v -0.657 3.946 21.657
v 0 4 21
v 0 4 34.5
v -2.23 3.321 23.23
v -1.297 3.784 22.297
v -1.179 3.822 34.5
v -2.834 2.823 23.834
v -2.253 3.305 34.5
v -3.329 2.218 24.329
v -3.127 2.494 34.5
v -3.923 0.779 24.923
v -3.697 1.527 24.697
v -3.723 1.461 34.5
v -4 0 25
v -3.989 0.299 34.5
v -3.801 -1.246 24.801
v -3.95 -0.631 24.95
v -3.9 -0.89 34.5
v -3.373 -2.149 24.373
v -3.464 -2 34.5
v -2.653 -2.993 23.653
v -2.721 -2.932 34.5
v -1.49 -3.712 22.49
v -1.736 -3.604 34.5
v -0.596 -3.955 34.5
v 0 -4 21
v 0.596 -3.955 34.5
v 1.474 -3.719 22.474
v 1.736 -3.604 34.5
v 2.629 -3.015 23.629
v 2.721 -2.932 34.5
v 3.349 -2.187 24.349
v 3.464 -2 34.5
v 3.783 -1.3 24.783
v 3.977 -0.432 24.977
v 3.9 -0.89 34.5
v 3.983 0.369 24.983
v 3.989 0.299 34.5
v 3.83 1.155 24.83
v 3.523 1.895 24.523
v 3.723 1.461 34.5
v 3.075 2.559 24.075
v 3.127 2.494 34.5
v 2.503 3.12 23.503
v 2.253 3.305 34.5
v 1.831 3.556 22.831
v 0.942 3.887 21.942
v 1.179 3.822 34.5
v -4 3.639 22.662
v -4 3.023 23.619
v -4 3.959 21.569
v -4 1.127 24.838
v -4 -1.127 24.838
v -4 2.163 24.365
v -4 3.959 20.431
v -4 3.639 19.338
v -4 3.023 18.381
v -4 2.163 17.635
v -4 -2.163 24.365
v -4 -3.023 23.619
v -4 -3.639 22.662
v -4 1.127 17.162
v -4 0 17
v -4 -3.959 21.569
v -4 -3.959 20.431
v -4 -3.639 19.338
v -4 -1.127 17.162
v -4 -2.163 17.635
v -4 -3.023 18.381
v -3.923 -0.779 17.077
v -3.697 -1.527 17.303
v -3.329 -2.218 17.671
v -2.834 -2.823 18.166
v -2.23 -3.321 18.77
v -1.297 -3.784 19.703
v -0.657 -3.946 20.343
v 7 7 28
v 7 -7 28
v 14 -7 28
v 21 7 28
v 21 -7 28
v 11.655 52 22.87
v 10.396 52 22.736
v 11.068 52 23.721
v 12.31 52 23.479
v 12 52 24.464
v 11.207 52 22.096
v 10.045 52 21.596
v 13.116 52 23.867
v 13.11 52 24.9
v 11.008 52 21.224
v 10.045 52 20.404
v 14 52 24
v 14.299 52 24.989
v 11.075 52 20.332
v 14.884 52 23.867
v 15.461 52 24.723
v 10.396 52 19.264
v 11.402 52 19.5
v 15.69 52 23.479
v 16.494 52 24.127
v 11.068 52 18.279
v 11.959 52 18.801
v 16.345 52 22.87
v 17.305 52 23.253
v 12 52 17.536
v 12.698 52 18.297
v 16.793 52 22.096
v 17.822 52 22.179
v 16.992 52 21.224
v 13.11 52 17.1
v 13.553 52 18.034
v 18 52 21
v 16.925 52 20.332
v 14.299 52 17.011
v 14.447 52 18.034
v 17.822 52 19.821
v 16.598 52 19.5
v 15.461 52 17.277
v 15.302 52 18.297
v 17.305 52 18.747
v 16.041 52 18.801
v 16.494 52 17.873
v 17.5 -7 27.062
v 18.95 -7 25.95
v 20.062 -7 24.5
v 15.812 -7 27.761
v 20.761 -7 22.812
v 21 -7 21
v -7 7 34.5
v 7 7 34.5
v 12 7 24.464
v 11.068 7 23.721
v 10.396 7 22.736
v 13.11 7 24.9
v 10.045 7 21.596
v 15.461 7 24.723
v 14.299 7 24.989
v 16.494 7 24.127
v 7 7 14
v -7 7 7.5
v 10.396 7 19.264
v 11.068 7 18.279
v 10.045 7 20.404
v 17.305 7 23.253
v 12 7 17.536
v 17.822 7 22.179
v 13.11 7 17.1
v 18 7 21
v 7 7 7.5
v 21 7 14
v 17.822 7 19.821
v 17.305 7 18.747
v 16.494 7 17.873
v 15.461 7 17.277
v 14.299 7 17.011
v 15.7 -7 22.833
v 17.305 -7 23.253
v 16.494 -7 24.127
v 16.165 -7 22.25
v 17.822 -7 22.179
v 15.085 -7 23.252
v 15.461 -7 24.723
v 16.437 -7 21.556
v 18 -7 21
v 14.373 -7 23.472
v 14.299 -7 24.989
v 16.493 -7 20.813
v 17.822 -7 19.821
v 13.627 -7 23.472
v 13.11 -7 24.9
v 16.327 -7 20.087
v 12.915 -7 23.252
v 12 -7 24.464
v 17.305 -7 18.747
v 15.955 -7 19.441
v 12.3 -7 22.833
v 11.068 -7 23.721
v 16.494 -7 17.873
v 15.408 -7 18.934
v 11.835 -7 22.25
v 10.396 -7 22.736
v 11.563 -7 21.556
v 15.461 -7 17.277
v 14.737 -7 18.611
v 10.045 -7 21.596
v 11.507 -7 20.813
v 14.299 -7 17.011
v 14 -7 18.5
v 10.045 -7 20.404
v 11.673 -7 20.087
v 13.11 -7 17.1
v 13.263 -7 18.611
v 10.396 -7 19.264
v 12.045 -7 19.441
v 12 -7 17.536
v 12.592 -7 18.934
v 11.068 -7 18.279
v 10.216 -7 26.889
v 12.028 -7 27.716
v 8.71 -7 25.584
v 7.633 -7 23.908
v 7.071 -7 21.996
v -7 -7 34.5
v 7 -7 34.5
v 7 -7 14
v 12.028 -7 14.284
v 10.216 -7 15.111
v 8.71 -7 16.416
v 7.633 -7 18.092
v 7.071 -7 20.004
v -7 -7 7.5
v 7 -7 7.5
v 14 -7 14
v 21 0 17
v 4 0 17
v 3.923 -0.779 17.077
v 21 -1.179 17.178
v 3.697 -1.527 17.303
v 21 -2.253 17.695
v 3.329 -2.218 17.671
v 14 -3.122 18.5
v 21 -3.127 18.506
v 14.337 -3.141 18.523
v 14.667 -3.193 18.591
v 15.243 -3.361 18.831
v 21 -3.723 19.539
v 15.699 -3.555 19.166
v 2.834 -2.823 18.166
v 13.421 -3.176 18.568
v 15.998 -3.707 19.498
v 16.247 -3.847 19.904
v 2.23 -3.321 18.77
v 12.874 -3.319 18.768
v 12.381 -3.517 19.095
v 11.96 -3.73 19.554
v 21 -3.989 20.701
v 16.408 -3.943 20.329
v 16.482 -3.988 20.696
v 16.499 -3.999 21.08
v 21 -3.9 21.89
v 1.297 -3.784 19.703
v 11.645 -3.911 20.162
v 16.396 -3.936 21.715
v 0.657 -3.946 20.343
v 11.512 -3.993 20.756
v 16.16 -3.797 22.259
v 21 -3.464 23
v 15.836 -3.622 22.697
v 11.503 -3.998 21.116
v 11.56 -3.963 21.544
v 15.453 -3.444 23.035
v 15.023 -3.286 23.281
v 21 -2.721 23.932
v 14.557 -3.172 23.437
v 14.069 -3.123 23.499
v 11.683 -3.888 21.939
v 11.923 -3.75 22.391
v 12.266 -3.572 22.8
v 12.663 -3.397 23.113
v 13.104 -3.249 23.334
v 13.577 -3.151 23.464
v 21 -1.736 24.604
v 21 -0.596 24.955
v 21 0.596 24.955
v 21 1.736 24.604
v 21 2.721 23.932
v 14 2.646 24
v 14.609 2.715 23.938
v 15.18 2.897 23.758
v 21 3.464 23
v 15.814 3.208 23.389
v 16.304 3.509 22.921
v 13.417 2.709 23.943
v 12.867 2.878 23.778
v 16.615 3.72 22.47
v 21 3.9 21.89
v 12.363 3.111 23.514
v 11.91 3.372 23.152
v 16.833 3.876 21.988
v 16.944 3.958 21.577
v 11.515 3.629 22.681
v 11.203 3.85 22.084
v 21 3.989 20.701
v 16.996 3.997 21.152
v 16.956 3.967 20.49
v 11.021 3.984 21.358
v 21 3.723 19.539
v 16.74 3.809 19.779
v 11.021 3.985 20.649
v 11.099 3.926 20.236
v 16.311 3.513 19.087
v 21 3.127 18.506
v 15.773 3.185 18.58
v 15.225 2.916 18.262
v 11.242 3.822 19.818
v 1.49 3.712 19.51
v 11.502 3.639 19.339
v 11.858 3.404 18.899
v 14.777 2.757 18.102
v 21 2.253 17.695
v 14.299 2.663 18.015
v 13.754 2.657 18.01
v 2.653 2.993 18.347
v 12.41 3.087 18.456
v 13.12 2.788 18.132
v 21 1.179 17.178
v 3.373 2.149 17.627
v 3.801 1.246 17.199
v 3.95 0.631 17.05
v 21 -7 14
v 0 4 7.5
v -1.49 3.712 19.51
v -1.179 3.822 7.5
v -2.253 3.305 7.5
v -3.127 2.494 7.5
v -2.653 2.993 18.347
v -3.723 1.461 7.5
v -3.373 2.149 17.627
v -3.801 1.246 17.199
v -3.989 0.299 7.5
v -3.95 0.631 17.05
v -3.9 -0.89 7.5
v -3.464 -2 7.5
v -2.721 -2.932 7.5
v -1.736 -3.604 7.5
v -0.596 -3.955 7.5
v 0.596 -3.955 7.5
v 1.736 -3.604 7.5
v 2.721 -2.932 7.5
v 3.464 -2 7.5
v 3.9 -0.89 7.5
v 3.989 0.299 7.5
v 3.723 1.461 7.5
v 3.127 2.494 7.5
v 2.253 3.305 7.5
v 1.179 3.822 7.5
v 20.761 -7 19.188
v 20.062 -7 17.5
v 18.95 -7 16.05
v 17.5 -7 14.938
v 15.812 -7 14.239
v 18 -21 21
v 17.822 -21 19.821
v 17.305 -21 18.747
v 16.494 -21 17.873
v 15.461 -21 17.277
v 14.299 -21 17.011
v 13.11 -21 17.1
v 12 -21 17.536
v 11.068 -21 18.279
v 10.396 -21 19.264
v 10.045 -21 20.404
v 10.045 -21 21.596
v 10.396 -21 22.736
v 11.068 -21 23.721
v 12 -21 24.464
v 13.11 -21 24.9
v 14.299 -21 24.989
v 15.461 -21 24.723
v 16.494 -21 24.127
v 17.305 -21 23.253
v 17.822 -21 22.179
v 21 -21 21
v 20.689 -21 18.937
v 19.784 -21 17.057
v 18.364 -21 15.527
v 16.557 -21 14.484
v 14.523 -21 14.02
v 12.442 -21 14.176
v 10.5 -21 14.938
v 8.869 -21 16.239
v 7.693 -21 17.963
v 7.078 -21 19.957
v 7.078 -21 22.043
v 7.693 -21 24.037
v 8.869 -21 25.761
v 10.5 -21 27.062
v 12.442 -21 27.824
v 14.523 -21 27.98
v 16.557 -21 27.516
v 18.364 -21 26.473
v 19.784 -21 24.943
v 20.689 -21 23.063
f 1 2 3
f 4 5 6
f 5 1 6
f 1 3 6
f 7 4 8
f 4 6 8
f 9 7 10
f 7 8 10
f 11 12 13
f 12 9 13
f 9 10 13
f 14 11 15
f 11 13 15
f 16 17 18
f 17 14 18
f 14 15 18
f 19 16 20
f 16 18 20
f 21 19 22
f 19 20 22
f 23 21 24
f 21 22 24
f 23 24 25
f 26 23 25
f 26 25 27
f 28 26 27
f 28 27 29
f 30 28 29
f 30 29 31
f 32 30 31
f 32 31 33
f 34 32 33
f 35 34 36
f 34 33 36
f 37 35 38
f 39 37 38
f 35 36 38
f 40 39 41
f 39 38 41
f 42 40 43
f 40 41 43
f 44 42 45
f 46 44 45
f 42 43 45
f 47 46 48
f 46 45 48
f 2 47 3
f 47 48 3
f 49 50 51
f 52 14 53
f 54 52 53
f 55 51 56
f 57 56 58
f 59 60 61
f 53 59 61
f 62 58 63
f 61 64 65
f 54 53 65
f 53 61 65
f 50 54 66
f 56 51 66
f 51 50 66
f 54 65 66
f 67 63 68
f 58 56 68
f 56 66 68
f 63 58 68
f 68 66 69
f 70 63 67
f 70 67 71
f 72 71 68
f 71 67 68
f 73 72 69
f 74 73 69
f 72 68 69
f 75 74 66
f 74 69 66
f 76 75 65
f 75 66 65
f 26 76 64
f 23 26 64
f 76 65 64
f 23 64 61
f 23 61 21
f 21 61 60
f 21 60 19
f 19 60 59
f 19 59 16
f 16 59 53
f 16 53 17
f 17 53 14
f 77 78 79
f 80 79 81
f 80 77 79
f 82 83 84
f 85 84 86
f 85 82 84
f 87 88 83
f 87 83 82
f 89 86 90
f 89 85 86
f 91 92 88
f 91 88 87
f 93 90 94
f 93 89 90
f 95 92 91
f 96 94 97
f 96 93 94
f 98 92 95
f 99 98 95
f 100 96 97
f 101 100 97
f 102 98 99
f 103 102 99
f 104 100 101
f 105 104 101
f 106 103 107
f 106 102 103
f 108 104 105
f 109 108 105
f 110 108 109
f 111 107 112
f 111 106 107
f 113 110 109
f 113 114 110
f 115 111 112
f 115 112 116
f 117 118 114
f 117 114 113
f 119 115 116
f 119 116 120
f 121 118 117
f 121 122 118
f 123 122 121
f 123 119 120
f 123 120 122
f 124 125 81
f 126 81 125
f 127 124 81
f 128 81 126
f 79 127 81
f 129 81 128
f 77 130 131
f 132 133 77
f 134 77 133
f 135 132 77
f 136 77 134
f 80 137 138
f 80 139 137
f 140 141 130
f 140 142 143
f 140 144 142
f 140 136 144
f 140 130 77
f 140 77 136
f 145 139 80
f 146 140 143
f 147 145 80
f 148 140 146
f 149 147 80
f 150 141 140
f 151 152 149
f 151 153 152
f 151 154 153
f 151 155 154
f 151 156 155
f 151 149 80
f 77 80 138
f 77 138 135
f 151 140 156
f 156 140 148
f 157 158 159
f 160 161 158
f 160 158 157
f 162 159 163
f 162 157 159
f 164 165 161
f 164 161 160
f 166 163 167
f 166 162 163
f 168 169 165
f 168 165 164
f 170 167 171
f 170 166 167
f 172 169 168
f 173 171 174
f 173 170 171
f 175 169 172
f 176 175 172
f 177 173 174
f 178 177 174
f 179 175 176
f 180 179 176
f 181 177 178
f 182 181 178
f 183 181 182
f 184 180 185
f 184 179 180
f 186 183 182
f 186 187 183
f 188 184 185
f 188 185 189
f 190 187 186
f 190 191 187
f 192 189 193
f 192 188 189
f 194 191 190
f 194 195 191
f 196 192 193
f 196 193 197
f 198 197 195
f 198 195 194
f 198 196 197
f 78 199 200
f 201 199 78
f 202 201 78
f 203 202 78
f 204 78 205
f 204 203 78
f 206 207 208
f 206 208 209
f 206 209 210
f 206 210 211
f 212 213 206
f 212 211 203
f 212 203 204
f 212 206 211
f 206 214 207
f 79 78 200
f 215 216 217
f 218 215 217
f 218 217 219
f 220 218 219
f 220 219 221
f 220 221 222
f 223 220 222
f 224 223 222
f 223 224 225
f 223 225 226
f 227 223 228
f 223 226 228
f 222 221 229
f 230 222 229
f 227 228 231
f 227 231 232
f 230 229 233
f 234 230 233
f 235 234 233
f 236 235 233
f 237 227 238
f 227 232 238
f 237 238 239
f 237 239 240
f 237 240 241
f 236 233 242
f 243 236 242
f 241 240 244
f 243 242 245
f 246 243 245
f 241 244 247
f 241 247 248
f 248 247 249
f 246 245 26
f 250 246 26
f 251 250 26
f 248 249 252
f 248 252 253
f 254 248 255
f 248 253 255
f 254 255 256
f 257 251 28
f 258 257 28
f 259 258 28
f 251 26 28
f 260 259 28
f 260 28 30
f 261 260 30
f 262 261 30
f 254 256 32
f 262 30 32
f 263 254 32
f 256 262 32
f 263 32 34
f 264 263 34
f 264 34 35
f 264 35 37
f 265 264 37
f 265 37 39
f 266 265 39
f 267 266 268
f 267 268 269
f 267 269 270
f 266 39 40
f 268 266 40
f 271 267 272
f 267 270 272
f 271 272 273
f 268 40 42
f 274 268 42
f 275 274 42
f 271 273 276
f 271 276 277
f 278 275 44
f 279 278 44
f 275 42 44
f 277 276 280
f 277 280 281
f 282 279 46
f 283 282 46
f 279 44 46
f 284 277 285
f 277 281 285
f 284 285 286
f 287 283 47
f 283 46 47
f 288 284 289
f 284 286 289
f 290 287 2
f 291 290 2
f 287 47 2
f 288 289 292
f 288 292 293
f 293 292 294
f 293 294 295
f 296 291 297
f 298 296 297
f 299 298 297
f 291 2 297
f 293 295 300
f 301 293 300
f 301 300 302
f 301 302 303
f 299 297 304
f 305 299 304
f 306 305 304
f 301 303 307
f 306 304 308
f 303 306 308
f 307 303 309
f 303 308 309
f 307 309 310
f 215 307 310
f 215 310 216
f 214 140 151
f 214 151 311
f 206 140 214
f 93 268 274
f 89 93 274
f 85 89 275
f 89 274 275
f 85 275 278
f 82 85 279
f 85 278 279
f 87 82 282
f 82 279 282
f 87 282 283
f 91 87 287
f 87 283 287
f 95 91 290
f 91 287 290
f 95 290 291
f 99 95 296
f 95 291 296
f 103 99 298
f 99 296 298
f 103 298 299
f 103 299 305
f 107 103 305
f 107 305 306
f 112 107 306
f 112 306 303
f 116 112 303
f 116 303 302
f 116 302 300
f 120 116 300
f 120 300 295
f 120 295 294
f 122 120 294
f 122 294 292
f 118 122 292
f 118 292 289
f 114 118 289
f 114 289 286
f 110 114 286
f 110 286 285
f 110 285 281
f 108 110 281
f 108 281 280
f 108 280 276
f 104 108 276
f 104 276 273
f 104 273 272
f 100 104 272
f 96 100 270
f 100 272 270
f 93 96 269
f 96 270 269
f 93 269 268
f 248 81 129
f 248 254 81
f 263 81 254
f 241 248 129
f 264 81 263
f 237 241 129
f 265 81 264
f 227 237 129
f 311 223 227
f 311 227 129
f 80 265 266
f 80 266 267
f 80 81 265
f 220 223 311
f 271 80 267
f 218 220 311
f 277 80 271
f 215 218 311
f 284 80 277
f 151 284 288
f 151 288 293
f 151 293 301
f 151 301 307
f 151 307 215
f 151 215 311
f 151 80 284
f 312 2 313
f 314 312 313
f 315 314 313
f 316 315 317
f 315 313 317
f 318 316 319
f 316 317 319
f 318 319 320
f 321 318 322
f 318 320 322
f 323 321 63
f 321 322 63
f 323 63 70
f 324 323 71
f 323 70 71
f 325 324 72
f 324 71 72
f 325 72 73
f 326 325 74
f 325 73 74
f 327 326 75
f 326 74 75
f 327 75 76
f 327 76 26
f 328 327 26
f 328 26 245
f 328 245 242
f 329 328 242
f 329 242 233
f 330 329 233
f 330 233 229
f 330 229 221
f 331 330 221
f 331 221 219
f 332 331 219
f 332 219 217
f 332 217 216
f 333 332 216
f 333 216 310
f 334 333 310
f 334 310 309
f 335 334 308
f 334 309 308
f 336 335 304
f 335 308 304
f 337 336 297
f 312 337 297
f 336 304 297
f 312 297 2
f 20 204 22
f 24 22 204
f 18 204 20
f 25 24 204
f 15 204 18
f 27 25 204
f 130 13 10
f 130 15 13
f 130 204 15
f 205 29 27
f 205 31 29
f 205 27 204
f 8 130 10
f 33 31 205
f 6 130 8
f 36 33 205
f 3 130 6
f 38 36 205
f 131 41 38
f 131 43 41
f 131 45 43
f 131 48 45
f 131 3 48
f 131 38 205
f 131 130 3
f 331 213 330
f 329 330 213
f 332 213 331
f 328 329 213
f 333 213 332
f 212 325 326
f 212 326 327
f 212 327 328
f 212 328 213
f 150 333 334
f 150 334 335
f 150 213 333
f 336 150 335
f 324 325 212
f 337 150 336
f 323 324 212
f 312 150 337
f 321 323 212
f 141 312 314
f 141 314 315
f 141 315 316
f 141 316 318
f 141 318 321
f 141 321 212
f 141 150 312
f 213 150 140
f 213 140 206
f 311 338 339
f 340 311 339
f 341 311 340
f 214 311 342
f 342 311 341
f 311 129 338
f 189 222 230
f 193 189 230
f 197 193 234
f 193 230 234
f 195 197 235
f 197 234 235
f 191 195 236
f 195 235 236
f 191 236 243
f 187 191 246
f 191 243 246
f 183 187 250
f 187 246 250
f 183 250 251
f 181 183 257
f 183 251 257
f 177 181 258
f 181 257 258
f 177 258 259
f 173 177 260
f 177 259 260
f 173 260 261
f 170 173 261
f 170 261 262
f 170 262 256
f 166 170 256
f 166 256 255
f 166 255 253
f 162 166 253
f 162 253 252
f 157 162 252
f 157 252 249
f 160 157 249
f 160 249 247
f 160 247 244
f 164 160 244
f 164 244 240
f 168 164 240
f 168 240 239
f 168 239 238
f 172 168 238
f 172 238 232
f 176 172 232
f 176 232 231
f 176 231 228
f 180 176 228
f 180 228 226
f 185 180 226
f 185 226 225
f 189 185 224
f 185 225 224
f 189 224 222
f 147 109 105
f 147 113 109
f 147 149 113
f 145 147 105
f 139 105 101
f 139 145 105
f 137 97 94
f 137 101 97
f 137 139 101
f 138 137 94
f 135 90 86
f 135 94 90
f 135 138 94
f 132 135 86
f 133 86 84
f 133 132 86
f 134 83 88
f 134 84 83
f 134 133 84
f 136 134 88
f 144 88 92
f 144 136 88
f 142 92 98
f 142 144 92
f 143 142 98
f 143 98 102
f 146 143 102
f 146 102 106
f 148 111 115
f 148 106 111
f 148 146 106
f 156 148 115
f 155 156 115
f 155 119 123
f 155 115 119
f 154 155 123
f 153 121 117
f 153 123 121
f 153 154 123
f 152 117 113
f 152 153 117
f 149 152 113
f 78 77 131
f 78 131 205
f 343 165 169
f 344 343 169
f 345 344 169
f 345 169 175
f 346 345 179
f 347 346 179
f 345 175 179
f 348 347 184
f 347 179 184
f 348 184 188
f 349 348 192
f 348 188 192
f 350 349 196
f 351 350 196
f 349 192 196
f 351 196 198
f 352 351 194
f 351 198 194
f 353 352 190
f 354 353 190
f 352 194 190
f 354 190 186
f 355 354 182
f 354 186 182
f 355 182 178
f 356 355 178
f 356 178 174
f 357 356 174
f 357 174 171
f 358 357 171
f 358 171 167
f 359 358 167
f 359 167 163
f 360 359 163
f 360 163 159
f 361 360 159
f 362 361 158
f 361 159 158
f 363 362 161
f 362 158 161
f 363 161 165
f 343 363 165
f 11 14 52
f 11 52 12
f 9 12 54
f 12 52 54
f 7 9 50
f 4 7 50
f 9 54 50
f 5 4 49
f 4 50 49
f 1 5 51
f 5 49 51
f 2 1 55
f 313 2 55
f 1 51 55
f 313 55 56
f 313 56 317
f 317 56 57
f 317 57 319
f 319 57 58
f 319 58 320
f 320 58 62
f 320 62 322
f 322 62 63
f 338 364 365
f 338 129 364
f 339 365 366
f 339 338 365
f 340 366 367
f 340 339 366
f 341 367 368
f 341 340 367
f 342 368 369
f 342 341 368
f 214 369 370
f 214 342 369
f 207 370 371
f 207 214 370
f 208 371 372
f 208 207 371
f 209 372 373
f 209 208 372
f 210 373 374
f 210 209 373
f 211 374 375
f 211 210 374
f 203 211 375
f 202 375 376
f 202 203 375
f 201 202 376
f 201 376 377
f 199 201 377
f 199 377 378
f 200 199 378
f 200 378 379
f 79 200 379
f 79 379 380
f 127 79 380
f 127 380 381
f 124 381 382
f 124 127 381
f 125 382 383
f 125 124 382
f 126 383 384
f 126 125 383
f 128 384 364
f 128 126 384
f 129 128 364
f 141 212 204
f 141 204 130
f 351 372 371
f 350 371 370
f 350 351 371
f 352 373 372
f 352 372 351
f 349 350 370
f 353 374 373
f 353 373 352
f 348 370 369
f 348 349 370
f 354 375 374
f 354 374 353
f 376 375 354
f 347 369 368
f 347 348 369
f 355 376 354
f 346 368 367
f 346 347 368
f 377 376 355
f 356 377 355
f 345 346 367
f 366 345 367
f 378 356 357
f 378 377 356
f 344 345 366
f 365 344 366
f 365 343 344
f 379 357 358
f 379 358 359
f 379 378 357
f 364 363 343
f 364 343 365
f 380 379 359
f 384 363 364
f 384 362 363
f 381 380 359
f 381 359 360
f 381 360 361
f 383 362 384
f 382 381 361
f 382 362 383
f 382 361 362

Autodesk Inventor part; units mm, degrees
ref_plane "YZ Plane" through (0, 0, 0) normal (1, 0, 0) x (0, 1, 0)
ref_plane "XZ Plane" through (0, 0, 0) normal (0, 1, 0) x (-1, 0, 0)
ref_plane "XY Plane" through (0, 0, 0) normal (0, 0, 1) x (1, 0, 0)
sketch "Sketch1" plane through (0, 0, 0) normal (0, 0, 1) x (1, 0, 0)
  line L0 (-7, 7) -> (7, 7)
  line L1 (7, 7) -> (7, -7)
  line L2 (7, -7) -> (-7, -7)
  line L3 (-7, -7) -> (-7, 7)
  line L4 (-7, 7) -> (7, -7) construction
  line L5 (7, 7) -> (-7, -7) construction
  point P0 (0, 0)
  dimension "d0" = 14
  dimension "d1" = 14
extrude "Extrusion1" add sketch "Sketch1" along normal blind 28
sketch "Sketch2" plane through (7, -7, 0) normal (1, 0, 0) x (0, 0, -1)
  line L0 (-28, 0) -> (-28, 14) projected
  line L1 (-28, 14) -> (-14, 14)
  line L2 (-14, 14) -> (-14, 0)
  line L3 (-14, 0) -> (-28, 0)
  line L4 (-28, 0) -> (-28, 14)
  point P0 (0, 7)
  dimension "d4" = 14
  dimension "d5" = 14
extrude "Extrusion2" add sketch "Sketch2" along normal blind 14
sketch "Sketch3" plane through (21, -7, 0) normal (1, 0, 0) x (0, 0, -1)
  line L0 (-14, 0) -> (-14, 14) projected
  line L1 (-14, 14) -> (-28, 14) projected
  line L2 (-28, 14) -> (-28, 0) projected
  line L3 (-28, 0) -> (-14, 0) projected
  line L4 (-28, 14) -> (-14, 14)
  line L5 (-14, 14) -> (-14, 0)
  line L6 (-14, 0) -> (-28, 0)
  line L7 (-28, 0) -> (-28, 14)
  point P0 (0, 7)
  point P1 (-21, 7)
hole "Hole1" at (21, 0, 21) direction (-1, 0, 0) diameter 8 depth 25
sketch "Sketch4" plane through (0, 0, 0) normal (0, 0, -1) x (-1, 0, 0)
  line L0 (7, -7) -> (-7, -7) projected
  line L1 (7, 7) -> (7, -7) projected
  line L2 (-7, 7) -> (7, 7) projected
  line L3 (-7, -7) -> (-7, 7) projected
  point P0 (0, 0)
  point P1 (0, 0)
sketch "Sketch5" plane through (-7, 7, 0) normal (0, 1, 0) x (1, 0, 0)
  line L0 (14, 0) -> (0, 0) projected
  line L1 (0, 0) -> (0, -28) projected
  line L2 (0, -28) -> (28, -28) projected
  line L3 (28, -14) -> (28, -28) projected
  line L4 (14, -14) -> (28, -14) projected
  line L5 (14, 0) -> (14, -14) projected
  line L6 (14, -14) -> (28, -14)
  line L7 (28, -14) -> (28, -28)
  line L8 (28, -28) -> (14, -28)
  line L9 (14, -28) -> (14, -14)
  circle A0 centre (21, -21) radius 4
  point P0 (7, 0)
  dimension "d23" = 8
extrude "Extrusion3" add sketch "Sketch5" along normal blind 45 contours A0
thread "Thread1" size "M8x1.25" class "6g" standard "ANSI Metric M Profile" length 45 offset 36
sketch "Sketch6" plane through (14, 52, 21) normal (0, 1, 0) x (1, 0, 0)
  circle A0 centre (0, 0) radius 4 projected
  point P0 (-14, 21)
hole "Hole3" at (14, 52, 21) direction (0, -1, 0) diameter 6 depth 50 tip angle 118
sketch "Sketch7" plane through (-7, -7, 0) normal (0, -1, 0) x (1, 0, 0)
  line L0 (28, 28) -> (28, 14) projected
  line L1 (14, 14) -> (28, 14) projected
  line L2 (28, 28) -> (14, 28)
  line L3 (14, 28) -> (14, 14)
  line L4 (14, 14) -> (28, 14)
  line L5 (28, 14) -> (28, 28)
  circle A0 centre (21, 21) radius 3 projected
  circle A1 centre (21, 21) radius 7
  circle A2 centre (21, 21) radius 4 projected
  circle A3 centre (21, 21) radius 4
  line L6 (21, 21) -> (0, 21)
  line L7 (0, 0) -> (0, 28) projected
  line L8 (0, 21) -> (0, 34.5)
  line L9 (0, 34.5) -> (0, 21)
  line L10 (0, 21) -> (0, 7.5)
  point P0 (7, 0)
  dimension "d35" = 14
  dimension "d36" = 8
  dimension "d37" = 13.5
  dimension "d38" = 13.5
sketch "Sketch8" plane through (0, 0, 0) normal (0, 0, -1) x (-1, 0, 0)
  line L0 (7, -7) -> (-7, -7) projected
  line L1 (7, 7) -> (7, -7) projected
  line L2 (-7, -7) -> (7, -7)
  line L3 (7, -7) -> (7, 7)
  line L4 (7, 7) -> (-7, 7)
  line L5 (-7, 7) -> (-7, -7)
  point P0 (0, 0)
extrude "Extrusion4" cut sketch "Sketch8" against normal blind 7.5
sketch "Sketch9" plane through (0, 0, 28) normal (0, 0, 1) x (1, 0, 0)
  line L0 (-7, 7) -> (21, 7) projected
  line L1 (-7, 7) -> (7, 7)
  line L2 (7, 7) -> (7, -7)
  line L3 (7, -7) -> (-7, -7)
  line L4 (-7, -7) -> (-7, 7)
  point P0 (0, 0)
  dimension "d41" = 14
  dimension "d42" = 14
extrude "Extrusion5" add sketch "Sketch9" along normal blind 6.5
hole "Hole4" at (0, 0, 0) direction (0, 0, 1) diameter 8 end through all
extrude "Extrusion6" add sketch "Sketch7" along normal blind 14 contours A1
thread "Thread2" size "M8x1" class "6H" standard "ANSI Metric M Profile" length 45
sketch "Sketch10" plane through (14, -7, 21) normal (0, -1, 0) x (1, 0, 0)
  circle A0 centre (0, 0) radius 4 projected
  point P0 (-14, -21)
hole "Hole5" at (14, -7, 21) direction (0, 1, 0) diameter 5 depth 8
properties part number "HUDSON-1-45"
